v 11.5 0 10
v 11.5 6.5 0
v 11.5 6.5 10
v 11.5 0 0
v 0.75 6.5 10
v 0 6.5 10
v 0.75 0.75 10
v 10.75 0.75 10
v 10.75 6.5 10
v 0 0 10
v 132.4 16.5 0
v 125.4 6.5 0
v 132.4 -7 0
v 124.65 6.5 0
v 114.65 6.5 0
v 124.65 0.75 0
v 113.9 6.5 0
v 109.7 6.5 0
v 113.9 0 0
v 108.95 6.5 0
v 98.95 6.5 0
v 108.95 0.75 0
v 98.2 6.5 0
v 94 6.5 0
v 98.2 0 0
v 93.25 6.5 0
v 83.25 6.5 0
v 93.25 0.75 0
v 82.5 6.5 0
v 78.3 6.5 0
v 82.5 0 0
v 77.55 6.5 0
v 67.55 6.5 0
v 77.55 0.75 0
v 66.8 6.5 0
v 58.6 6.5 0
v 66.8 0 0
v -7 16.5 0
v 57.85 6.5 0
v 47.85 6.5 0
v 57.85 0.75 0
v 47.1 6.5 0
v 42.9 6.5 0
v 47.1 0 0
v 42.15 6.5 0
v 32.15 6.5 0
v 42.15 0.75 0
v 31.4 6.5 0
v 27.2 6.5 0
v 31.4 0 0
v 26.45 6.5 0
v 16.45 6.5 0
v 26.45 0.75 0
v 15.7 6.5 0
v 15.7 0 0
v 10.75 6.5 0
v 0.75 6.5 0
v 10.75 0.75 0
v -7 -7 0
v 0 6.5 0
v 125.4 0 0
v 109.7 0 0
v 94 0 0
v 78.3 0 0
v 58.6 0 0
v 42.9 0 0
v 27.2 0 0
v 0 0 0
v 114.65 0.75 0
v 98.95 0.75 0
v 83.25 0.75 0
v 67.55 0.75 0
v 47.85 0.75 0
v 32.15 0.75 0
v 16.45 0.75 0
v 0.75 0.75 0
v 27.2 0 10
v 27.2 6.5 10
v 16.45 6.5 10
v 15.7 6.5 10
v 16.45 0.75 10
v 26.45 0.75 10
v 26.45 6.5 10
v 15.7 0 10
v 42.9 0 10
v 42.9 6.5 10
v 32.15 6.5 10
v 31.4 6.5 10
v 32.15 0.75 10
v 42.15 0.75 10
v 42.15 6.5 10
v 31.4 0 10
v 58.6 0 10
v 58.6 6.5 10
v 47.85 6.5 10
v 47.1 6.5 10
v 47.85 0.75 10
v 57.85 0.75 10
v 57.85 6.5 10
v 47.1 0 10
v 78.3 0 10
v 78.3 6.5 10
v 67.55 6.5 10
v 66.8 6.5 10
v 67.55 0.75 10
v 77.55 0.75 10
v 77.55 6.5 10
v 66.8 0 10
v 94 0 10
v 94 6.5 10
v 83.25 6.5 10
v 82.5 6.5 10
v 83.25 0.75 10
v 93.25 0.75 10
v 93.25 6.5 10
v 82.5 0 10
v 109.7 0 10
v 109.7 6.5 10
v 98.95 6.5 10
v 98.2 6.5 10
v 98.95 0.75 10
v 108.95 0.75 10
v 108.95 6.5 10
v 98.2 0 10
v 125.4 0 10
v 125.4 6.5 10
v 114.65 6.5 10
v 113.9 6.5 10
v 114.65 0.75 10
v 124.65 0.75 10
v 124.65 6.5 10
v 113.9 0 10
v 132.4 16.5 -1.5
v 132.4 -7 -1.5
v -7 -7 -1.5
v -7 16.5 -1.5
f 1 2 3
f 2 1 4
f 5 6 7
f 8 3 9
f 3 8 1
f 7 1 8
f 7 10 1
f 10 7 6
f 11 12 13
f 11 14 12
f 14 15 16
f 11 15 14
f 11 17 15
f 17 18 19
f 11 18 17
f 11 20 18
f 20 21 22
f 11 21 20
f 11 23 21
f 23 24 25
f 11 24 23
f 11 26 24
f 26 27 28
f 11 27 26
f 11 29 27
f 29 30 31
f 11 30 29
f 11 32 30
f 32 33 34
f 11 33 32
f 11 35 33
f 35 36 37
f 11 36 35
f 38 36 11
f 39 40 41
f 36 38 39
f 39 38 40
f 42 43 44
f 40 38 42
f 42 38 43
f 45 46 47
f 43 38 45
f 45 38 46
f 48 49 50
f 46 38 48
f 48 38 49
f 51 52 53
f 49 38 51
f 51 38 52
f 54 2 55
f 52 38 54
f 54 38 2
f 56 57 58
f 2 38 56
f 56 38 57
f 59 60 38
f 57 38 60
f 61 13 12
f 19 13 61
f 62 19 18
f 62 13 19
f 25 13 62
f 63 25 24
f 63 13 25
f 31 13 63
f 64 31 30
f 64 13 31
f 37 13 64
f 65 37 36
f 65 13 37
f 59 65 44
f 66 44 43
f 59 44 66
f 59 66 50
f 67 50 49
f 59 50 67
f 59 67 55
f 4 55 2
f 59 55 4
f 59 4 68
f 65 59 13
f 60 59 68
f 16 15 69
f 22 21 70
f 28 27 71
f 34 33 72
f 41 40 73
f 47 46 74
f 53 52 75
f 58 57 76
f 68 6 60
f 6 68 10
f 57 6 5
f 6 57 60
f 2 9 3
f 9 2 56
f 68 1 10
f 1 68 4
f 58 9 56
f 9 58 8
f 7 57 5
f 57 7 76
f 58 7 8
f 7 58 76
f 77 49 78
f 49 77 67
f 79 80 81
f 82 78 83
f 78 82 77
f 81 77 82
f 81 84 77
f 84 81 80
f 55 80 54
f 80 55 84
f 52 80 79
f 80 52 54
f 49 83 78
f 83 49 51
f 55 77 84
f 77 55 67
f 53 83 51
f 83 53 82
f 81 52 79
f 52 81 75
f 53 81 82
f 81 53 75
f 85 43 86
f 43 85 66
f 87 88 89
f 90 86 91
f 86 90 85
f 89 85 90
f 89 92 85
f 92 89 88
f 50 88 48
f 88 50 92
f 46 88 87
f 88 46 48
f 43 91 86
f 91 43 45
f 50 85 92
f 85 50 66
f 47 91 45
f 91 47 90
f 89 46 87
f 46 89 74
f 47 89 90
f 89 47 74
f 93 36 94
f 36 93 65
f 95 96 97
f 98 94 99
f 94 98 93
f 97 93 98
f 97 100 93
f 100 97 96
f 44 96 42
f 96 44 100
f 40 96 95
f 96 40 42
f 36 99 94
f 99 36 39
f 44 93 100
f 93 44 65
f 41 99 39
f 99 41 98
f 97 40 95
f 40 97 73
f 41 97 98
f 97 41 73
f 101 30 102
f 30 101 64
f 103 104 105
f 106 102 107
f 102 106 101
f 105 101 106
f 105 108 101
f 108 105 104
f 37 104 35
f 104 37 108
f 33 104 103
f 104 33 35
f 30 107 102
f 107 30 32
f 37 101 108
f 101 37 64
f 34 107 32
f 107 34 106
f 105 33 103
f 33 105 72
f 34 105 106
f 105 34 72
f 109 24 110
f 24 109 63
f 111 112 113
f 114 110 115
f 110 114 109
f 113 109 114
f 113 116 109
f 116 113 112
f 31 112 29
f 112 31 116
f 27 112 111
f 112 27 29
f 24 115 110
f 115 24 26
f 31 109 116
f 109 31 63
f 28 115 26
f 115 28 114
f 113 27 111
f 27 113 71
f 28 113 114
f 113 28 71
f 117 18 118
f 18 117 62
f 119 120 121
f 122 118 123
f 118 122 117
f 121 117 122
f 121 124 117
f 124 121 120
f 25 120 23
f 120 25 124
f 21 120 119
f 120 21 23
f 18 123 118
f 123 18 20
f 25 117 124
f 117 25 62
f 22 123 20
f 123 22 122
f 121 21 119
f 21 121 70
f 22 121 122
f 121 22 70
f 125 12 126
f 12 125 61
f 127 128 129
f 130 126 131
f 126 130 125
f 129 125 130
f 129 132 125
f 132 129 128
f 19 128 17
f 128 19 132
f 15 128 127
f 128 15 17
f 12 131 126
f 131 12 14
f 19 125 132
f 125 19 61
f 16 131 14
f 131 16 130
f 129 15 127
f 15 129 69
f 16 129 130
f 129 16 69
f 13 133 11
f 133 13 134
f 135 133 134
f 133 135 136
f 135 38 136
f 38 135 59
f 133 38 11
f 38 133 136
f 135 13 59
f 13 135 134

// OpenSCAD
// Ethernet plug cap generator
// All values are in millimetres (mm)
// By gammy
// Thanks Koen Tavernier for showing me how to "get rid" of modulo operations! :)

// Switch properties
plug_spacing = 4.2; // Standard ethernet port spacing
num_plugs = 8;

// My switch consists of 2 modules of 4 ports each.
// There is therefore an additional space between each module
module_padding_every = 4;
padding_module = 4;

// Cover properties
thickness = 1.5;
padding_top = 10;
padding_bottom = 7;
padding_left = 7;
padding_right = 7;

// 8P8C plug dimensions (don't change these)
plug_w = 11.5;
plug_h = 6.5;
plug_d = 10;

module renderPlug() {
    wall_thickness = 1.5;
    difference() {
        cube([plug_w, plug_h, plug_d]);        
        cavity_w = plug_w - wall_thickness;
        cavity_h = plug_h;
        cx = (.5 * plug_w) - (.5 * cavity_w);        
        translate([cx, (.5 * wall_thickness), 0]) {
            cube([cavity_w, cavity_h + 1, plug_d]);
        }
    }
}

module renderPlugs(count, spacing) {    
    for(i = [1 : count]) {        
        offset = (i - 1) 
            * (plug_w + spacing) 
            + (round((i + 1) / module_padding_every) - 1) 
            * padding_module;
        
        translate([offset, 0, 0]) {
            renderPlug();
        }
    }
}

module renderPlate(count, spacing) {
    plate_plug_w = (num_plugs * (plug_w + plug_spacing)) - plug_spacing;    
    more = (round(num_plugs / module_padding_every) - 1) * padding_module;
    plate_w = padding_left + plate_plug_w + padding_right;
    plate_h = padding_bottom + plug_h + padding_top;
    translate([-padding_right, -padding_bottom, -thickness]) {
        cube([plate_w + more, plate_h, thickness]);
    }
}

renderPlate(num_plugs, plug_spacing);
renderPlugs(num_plugs, plug_spacing);
